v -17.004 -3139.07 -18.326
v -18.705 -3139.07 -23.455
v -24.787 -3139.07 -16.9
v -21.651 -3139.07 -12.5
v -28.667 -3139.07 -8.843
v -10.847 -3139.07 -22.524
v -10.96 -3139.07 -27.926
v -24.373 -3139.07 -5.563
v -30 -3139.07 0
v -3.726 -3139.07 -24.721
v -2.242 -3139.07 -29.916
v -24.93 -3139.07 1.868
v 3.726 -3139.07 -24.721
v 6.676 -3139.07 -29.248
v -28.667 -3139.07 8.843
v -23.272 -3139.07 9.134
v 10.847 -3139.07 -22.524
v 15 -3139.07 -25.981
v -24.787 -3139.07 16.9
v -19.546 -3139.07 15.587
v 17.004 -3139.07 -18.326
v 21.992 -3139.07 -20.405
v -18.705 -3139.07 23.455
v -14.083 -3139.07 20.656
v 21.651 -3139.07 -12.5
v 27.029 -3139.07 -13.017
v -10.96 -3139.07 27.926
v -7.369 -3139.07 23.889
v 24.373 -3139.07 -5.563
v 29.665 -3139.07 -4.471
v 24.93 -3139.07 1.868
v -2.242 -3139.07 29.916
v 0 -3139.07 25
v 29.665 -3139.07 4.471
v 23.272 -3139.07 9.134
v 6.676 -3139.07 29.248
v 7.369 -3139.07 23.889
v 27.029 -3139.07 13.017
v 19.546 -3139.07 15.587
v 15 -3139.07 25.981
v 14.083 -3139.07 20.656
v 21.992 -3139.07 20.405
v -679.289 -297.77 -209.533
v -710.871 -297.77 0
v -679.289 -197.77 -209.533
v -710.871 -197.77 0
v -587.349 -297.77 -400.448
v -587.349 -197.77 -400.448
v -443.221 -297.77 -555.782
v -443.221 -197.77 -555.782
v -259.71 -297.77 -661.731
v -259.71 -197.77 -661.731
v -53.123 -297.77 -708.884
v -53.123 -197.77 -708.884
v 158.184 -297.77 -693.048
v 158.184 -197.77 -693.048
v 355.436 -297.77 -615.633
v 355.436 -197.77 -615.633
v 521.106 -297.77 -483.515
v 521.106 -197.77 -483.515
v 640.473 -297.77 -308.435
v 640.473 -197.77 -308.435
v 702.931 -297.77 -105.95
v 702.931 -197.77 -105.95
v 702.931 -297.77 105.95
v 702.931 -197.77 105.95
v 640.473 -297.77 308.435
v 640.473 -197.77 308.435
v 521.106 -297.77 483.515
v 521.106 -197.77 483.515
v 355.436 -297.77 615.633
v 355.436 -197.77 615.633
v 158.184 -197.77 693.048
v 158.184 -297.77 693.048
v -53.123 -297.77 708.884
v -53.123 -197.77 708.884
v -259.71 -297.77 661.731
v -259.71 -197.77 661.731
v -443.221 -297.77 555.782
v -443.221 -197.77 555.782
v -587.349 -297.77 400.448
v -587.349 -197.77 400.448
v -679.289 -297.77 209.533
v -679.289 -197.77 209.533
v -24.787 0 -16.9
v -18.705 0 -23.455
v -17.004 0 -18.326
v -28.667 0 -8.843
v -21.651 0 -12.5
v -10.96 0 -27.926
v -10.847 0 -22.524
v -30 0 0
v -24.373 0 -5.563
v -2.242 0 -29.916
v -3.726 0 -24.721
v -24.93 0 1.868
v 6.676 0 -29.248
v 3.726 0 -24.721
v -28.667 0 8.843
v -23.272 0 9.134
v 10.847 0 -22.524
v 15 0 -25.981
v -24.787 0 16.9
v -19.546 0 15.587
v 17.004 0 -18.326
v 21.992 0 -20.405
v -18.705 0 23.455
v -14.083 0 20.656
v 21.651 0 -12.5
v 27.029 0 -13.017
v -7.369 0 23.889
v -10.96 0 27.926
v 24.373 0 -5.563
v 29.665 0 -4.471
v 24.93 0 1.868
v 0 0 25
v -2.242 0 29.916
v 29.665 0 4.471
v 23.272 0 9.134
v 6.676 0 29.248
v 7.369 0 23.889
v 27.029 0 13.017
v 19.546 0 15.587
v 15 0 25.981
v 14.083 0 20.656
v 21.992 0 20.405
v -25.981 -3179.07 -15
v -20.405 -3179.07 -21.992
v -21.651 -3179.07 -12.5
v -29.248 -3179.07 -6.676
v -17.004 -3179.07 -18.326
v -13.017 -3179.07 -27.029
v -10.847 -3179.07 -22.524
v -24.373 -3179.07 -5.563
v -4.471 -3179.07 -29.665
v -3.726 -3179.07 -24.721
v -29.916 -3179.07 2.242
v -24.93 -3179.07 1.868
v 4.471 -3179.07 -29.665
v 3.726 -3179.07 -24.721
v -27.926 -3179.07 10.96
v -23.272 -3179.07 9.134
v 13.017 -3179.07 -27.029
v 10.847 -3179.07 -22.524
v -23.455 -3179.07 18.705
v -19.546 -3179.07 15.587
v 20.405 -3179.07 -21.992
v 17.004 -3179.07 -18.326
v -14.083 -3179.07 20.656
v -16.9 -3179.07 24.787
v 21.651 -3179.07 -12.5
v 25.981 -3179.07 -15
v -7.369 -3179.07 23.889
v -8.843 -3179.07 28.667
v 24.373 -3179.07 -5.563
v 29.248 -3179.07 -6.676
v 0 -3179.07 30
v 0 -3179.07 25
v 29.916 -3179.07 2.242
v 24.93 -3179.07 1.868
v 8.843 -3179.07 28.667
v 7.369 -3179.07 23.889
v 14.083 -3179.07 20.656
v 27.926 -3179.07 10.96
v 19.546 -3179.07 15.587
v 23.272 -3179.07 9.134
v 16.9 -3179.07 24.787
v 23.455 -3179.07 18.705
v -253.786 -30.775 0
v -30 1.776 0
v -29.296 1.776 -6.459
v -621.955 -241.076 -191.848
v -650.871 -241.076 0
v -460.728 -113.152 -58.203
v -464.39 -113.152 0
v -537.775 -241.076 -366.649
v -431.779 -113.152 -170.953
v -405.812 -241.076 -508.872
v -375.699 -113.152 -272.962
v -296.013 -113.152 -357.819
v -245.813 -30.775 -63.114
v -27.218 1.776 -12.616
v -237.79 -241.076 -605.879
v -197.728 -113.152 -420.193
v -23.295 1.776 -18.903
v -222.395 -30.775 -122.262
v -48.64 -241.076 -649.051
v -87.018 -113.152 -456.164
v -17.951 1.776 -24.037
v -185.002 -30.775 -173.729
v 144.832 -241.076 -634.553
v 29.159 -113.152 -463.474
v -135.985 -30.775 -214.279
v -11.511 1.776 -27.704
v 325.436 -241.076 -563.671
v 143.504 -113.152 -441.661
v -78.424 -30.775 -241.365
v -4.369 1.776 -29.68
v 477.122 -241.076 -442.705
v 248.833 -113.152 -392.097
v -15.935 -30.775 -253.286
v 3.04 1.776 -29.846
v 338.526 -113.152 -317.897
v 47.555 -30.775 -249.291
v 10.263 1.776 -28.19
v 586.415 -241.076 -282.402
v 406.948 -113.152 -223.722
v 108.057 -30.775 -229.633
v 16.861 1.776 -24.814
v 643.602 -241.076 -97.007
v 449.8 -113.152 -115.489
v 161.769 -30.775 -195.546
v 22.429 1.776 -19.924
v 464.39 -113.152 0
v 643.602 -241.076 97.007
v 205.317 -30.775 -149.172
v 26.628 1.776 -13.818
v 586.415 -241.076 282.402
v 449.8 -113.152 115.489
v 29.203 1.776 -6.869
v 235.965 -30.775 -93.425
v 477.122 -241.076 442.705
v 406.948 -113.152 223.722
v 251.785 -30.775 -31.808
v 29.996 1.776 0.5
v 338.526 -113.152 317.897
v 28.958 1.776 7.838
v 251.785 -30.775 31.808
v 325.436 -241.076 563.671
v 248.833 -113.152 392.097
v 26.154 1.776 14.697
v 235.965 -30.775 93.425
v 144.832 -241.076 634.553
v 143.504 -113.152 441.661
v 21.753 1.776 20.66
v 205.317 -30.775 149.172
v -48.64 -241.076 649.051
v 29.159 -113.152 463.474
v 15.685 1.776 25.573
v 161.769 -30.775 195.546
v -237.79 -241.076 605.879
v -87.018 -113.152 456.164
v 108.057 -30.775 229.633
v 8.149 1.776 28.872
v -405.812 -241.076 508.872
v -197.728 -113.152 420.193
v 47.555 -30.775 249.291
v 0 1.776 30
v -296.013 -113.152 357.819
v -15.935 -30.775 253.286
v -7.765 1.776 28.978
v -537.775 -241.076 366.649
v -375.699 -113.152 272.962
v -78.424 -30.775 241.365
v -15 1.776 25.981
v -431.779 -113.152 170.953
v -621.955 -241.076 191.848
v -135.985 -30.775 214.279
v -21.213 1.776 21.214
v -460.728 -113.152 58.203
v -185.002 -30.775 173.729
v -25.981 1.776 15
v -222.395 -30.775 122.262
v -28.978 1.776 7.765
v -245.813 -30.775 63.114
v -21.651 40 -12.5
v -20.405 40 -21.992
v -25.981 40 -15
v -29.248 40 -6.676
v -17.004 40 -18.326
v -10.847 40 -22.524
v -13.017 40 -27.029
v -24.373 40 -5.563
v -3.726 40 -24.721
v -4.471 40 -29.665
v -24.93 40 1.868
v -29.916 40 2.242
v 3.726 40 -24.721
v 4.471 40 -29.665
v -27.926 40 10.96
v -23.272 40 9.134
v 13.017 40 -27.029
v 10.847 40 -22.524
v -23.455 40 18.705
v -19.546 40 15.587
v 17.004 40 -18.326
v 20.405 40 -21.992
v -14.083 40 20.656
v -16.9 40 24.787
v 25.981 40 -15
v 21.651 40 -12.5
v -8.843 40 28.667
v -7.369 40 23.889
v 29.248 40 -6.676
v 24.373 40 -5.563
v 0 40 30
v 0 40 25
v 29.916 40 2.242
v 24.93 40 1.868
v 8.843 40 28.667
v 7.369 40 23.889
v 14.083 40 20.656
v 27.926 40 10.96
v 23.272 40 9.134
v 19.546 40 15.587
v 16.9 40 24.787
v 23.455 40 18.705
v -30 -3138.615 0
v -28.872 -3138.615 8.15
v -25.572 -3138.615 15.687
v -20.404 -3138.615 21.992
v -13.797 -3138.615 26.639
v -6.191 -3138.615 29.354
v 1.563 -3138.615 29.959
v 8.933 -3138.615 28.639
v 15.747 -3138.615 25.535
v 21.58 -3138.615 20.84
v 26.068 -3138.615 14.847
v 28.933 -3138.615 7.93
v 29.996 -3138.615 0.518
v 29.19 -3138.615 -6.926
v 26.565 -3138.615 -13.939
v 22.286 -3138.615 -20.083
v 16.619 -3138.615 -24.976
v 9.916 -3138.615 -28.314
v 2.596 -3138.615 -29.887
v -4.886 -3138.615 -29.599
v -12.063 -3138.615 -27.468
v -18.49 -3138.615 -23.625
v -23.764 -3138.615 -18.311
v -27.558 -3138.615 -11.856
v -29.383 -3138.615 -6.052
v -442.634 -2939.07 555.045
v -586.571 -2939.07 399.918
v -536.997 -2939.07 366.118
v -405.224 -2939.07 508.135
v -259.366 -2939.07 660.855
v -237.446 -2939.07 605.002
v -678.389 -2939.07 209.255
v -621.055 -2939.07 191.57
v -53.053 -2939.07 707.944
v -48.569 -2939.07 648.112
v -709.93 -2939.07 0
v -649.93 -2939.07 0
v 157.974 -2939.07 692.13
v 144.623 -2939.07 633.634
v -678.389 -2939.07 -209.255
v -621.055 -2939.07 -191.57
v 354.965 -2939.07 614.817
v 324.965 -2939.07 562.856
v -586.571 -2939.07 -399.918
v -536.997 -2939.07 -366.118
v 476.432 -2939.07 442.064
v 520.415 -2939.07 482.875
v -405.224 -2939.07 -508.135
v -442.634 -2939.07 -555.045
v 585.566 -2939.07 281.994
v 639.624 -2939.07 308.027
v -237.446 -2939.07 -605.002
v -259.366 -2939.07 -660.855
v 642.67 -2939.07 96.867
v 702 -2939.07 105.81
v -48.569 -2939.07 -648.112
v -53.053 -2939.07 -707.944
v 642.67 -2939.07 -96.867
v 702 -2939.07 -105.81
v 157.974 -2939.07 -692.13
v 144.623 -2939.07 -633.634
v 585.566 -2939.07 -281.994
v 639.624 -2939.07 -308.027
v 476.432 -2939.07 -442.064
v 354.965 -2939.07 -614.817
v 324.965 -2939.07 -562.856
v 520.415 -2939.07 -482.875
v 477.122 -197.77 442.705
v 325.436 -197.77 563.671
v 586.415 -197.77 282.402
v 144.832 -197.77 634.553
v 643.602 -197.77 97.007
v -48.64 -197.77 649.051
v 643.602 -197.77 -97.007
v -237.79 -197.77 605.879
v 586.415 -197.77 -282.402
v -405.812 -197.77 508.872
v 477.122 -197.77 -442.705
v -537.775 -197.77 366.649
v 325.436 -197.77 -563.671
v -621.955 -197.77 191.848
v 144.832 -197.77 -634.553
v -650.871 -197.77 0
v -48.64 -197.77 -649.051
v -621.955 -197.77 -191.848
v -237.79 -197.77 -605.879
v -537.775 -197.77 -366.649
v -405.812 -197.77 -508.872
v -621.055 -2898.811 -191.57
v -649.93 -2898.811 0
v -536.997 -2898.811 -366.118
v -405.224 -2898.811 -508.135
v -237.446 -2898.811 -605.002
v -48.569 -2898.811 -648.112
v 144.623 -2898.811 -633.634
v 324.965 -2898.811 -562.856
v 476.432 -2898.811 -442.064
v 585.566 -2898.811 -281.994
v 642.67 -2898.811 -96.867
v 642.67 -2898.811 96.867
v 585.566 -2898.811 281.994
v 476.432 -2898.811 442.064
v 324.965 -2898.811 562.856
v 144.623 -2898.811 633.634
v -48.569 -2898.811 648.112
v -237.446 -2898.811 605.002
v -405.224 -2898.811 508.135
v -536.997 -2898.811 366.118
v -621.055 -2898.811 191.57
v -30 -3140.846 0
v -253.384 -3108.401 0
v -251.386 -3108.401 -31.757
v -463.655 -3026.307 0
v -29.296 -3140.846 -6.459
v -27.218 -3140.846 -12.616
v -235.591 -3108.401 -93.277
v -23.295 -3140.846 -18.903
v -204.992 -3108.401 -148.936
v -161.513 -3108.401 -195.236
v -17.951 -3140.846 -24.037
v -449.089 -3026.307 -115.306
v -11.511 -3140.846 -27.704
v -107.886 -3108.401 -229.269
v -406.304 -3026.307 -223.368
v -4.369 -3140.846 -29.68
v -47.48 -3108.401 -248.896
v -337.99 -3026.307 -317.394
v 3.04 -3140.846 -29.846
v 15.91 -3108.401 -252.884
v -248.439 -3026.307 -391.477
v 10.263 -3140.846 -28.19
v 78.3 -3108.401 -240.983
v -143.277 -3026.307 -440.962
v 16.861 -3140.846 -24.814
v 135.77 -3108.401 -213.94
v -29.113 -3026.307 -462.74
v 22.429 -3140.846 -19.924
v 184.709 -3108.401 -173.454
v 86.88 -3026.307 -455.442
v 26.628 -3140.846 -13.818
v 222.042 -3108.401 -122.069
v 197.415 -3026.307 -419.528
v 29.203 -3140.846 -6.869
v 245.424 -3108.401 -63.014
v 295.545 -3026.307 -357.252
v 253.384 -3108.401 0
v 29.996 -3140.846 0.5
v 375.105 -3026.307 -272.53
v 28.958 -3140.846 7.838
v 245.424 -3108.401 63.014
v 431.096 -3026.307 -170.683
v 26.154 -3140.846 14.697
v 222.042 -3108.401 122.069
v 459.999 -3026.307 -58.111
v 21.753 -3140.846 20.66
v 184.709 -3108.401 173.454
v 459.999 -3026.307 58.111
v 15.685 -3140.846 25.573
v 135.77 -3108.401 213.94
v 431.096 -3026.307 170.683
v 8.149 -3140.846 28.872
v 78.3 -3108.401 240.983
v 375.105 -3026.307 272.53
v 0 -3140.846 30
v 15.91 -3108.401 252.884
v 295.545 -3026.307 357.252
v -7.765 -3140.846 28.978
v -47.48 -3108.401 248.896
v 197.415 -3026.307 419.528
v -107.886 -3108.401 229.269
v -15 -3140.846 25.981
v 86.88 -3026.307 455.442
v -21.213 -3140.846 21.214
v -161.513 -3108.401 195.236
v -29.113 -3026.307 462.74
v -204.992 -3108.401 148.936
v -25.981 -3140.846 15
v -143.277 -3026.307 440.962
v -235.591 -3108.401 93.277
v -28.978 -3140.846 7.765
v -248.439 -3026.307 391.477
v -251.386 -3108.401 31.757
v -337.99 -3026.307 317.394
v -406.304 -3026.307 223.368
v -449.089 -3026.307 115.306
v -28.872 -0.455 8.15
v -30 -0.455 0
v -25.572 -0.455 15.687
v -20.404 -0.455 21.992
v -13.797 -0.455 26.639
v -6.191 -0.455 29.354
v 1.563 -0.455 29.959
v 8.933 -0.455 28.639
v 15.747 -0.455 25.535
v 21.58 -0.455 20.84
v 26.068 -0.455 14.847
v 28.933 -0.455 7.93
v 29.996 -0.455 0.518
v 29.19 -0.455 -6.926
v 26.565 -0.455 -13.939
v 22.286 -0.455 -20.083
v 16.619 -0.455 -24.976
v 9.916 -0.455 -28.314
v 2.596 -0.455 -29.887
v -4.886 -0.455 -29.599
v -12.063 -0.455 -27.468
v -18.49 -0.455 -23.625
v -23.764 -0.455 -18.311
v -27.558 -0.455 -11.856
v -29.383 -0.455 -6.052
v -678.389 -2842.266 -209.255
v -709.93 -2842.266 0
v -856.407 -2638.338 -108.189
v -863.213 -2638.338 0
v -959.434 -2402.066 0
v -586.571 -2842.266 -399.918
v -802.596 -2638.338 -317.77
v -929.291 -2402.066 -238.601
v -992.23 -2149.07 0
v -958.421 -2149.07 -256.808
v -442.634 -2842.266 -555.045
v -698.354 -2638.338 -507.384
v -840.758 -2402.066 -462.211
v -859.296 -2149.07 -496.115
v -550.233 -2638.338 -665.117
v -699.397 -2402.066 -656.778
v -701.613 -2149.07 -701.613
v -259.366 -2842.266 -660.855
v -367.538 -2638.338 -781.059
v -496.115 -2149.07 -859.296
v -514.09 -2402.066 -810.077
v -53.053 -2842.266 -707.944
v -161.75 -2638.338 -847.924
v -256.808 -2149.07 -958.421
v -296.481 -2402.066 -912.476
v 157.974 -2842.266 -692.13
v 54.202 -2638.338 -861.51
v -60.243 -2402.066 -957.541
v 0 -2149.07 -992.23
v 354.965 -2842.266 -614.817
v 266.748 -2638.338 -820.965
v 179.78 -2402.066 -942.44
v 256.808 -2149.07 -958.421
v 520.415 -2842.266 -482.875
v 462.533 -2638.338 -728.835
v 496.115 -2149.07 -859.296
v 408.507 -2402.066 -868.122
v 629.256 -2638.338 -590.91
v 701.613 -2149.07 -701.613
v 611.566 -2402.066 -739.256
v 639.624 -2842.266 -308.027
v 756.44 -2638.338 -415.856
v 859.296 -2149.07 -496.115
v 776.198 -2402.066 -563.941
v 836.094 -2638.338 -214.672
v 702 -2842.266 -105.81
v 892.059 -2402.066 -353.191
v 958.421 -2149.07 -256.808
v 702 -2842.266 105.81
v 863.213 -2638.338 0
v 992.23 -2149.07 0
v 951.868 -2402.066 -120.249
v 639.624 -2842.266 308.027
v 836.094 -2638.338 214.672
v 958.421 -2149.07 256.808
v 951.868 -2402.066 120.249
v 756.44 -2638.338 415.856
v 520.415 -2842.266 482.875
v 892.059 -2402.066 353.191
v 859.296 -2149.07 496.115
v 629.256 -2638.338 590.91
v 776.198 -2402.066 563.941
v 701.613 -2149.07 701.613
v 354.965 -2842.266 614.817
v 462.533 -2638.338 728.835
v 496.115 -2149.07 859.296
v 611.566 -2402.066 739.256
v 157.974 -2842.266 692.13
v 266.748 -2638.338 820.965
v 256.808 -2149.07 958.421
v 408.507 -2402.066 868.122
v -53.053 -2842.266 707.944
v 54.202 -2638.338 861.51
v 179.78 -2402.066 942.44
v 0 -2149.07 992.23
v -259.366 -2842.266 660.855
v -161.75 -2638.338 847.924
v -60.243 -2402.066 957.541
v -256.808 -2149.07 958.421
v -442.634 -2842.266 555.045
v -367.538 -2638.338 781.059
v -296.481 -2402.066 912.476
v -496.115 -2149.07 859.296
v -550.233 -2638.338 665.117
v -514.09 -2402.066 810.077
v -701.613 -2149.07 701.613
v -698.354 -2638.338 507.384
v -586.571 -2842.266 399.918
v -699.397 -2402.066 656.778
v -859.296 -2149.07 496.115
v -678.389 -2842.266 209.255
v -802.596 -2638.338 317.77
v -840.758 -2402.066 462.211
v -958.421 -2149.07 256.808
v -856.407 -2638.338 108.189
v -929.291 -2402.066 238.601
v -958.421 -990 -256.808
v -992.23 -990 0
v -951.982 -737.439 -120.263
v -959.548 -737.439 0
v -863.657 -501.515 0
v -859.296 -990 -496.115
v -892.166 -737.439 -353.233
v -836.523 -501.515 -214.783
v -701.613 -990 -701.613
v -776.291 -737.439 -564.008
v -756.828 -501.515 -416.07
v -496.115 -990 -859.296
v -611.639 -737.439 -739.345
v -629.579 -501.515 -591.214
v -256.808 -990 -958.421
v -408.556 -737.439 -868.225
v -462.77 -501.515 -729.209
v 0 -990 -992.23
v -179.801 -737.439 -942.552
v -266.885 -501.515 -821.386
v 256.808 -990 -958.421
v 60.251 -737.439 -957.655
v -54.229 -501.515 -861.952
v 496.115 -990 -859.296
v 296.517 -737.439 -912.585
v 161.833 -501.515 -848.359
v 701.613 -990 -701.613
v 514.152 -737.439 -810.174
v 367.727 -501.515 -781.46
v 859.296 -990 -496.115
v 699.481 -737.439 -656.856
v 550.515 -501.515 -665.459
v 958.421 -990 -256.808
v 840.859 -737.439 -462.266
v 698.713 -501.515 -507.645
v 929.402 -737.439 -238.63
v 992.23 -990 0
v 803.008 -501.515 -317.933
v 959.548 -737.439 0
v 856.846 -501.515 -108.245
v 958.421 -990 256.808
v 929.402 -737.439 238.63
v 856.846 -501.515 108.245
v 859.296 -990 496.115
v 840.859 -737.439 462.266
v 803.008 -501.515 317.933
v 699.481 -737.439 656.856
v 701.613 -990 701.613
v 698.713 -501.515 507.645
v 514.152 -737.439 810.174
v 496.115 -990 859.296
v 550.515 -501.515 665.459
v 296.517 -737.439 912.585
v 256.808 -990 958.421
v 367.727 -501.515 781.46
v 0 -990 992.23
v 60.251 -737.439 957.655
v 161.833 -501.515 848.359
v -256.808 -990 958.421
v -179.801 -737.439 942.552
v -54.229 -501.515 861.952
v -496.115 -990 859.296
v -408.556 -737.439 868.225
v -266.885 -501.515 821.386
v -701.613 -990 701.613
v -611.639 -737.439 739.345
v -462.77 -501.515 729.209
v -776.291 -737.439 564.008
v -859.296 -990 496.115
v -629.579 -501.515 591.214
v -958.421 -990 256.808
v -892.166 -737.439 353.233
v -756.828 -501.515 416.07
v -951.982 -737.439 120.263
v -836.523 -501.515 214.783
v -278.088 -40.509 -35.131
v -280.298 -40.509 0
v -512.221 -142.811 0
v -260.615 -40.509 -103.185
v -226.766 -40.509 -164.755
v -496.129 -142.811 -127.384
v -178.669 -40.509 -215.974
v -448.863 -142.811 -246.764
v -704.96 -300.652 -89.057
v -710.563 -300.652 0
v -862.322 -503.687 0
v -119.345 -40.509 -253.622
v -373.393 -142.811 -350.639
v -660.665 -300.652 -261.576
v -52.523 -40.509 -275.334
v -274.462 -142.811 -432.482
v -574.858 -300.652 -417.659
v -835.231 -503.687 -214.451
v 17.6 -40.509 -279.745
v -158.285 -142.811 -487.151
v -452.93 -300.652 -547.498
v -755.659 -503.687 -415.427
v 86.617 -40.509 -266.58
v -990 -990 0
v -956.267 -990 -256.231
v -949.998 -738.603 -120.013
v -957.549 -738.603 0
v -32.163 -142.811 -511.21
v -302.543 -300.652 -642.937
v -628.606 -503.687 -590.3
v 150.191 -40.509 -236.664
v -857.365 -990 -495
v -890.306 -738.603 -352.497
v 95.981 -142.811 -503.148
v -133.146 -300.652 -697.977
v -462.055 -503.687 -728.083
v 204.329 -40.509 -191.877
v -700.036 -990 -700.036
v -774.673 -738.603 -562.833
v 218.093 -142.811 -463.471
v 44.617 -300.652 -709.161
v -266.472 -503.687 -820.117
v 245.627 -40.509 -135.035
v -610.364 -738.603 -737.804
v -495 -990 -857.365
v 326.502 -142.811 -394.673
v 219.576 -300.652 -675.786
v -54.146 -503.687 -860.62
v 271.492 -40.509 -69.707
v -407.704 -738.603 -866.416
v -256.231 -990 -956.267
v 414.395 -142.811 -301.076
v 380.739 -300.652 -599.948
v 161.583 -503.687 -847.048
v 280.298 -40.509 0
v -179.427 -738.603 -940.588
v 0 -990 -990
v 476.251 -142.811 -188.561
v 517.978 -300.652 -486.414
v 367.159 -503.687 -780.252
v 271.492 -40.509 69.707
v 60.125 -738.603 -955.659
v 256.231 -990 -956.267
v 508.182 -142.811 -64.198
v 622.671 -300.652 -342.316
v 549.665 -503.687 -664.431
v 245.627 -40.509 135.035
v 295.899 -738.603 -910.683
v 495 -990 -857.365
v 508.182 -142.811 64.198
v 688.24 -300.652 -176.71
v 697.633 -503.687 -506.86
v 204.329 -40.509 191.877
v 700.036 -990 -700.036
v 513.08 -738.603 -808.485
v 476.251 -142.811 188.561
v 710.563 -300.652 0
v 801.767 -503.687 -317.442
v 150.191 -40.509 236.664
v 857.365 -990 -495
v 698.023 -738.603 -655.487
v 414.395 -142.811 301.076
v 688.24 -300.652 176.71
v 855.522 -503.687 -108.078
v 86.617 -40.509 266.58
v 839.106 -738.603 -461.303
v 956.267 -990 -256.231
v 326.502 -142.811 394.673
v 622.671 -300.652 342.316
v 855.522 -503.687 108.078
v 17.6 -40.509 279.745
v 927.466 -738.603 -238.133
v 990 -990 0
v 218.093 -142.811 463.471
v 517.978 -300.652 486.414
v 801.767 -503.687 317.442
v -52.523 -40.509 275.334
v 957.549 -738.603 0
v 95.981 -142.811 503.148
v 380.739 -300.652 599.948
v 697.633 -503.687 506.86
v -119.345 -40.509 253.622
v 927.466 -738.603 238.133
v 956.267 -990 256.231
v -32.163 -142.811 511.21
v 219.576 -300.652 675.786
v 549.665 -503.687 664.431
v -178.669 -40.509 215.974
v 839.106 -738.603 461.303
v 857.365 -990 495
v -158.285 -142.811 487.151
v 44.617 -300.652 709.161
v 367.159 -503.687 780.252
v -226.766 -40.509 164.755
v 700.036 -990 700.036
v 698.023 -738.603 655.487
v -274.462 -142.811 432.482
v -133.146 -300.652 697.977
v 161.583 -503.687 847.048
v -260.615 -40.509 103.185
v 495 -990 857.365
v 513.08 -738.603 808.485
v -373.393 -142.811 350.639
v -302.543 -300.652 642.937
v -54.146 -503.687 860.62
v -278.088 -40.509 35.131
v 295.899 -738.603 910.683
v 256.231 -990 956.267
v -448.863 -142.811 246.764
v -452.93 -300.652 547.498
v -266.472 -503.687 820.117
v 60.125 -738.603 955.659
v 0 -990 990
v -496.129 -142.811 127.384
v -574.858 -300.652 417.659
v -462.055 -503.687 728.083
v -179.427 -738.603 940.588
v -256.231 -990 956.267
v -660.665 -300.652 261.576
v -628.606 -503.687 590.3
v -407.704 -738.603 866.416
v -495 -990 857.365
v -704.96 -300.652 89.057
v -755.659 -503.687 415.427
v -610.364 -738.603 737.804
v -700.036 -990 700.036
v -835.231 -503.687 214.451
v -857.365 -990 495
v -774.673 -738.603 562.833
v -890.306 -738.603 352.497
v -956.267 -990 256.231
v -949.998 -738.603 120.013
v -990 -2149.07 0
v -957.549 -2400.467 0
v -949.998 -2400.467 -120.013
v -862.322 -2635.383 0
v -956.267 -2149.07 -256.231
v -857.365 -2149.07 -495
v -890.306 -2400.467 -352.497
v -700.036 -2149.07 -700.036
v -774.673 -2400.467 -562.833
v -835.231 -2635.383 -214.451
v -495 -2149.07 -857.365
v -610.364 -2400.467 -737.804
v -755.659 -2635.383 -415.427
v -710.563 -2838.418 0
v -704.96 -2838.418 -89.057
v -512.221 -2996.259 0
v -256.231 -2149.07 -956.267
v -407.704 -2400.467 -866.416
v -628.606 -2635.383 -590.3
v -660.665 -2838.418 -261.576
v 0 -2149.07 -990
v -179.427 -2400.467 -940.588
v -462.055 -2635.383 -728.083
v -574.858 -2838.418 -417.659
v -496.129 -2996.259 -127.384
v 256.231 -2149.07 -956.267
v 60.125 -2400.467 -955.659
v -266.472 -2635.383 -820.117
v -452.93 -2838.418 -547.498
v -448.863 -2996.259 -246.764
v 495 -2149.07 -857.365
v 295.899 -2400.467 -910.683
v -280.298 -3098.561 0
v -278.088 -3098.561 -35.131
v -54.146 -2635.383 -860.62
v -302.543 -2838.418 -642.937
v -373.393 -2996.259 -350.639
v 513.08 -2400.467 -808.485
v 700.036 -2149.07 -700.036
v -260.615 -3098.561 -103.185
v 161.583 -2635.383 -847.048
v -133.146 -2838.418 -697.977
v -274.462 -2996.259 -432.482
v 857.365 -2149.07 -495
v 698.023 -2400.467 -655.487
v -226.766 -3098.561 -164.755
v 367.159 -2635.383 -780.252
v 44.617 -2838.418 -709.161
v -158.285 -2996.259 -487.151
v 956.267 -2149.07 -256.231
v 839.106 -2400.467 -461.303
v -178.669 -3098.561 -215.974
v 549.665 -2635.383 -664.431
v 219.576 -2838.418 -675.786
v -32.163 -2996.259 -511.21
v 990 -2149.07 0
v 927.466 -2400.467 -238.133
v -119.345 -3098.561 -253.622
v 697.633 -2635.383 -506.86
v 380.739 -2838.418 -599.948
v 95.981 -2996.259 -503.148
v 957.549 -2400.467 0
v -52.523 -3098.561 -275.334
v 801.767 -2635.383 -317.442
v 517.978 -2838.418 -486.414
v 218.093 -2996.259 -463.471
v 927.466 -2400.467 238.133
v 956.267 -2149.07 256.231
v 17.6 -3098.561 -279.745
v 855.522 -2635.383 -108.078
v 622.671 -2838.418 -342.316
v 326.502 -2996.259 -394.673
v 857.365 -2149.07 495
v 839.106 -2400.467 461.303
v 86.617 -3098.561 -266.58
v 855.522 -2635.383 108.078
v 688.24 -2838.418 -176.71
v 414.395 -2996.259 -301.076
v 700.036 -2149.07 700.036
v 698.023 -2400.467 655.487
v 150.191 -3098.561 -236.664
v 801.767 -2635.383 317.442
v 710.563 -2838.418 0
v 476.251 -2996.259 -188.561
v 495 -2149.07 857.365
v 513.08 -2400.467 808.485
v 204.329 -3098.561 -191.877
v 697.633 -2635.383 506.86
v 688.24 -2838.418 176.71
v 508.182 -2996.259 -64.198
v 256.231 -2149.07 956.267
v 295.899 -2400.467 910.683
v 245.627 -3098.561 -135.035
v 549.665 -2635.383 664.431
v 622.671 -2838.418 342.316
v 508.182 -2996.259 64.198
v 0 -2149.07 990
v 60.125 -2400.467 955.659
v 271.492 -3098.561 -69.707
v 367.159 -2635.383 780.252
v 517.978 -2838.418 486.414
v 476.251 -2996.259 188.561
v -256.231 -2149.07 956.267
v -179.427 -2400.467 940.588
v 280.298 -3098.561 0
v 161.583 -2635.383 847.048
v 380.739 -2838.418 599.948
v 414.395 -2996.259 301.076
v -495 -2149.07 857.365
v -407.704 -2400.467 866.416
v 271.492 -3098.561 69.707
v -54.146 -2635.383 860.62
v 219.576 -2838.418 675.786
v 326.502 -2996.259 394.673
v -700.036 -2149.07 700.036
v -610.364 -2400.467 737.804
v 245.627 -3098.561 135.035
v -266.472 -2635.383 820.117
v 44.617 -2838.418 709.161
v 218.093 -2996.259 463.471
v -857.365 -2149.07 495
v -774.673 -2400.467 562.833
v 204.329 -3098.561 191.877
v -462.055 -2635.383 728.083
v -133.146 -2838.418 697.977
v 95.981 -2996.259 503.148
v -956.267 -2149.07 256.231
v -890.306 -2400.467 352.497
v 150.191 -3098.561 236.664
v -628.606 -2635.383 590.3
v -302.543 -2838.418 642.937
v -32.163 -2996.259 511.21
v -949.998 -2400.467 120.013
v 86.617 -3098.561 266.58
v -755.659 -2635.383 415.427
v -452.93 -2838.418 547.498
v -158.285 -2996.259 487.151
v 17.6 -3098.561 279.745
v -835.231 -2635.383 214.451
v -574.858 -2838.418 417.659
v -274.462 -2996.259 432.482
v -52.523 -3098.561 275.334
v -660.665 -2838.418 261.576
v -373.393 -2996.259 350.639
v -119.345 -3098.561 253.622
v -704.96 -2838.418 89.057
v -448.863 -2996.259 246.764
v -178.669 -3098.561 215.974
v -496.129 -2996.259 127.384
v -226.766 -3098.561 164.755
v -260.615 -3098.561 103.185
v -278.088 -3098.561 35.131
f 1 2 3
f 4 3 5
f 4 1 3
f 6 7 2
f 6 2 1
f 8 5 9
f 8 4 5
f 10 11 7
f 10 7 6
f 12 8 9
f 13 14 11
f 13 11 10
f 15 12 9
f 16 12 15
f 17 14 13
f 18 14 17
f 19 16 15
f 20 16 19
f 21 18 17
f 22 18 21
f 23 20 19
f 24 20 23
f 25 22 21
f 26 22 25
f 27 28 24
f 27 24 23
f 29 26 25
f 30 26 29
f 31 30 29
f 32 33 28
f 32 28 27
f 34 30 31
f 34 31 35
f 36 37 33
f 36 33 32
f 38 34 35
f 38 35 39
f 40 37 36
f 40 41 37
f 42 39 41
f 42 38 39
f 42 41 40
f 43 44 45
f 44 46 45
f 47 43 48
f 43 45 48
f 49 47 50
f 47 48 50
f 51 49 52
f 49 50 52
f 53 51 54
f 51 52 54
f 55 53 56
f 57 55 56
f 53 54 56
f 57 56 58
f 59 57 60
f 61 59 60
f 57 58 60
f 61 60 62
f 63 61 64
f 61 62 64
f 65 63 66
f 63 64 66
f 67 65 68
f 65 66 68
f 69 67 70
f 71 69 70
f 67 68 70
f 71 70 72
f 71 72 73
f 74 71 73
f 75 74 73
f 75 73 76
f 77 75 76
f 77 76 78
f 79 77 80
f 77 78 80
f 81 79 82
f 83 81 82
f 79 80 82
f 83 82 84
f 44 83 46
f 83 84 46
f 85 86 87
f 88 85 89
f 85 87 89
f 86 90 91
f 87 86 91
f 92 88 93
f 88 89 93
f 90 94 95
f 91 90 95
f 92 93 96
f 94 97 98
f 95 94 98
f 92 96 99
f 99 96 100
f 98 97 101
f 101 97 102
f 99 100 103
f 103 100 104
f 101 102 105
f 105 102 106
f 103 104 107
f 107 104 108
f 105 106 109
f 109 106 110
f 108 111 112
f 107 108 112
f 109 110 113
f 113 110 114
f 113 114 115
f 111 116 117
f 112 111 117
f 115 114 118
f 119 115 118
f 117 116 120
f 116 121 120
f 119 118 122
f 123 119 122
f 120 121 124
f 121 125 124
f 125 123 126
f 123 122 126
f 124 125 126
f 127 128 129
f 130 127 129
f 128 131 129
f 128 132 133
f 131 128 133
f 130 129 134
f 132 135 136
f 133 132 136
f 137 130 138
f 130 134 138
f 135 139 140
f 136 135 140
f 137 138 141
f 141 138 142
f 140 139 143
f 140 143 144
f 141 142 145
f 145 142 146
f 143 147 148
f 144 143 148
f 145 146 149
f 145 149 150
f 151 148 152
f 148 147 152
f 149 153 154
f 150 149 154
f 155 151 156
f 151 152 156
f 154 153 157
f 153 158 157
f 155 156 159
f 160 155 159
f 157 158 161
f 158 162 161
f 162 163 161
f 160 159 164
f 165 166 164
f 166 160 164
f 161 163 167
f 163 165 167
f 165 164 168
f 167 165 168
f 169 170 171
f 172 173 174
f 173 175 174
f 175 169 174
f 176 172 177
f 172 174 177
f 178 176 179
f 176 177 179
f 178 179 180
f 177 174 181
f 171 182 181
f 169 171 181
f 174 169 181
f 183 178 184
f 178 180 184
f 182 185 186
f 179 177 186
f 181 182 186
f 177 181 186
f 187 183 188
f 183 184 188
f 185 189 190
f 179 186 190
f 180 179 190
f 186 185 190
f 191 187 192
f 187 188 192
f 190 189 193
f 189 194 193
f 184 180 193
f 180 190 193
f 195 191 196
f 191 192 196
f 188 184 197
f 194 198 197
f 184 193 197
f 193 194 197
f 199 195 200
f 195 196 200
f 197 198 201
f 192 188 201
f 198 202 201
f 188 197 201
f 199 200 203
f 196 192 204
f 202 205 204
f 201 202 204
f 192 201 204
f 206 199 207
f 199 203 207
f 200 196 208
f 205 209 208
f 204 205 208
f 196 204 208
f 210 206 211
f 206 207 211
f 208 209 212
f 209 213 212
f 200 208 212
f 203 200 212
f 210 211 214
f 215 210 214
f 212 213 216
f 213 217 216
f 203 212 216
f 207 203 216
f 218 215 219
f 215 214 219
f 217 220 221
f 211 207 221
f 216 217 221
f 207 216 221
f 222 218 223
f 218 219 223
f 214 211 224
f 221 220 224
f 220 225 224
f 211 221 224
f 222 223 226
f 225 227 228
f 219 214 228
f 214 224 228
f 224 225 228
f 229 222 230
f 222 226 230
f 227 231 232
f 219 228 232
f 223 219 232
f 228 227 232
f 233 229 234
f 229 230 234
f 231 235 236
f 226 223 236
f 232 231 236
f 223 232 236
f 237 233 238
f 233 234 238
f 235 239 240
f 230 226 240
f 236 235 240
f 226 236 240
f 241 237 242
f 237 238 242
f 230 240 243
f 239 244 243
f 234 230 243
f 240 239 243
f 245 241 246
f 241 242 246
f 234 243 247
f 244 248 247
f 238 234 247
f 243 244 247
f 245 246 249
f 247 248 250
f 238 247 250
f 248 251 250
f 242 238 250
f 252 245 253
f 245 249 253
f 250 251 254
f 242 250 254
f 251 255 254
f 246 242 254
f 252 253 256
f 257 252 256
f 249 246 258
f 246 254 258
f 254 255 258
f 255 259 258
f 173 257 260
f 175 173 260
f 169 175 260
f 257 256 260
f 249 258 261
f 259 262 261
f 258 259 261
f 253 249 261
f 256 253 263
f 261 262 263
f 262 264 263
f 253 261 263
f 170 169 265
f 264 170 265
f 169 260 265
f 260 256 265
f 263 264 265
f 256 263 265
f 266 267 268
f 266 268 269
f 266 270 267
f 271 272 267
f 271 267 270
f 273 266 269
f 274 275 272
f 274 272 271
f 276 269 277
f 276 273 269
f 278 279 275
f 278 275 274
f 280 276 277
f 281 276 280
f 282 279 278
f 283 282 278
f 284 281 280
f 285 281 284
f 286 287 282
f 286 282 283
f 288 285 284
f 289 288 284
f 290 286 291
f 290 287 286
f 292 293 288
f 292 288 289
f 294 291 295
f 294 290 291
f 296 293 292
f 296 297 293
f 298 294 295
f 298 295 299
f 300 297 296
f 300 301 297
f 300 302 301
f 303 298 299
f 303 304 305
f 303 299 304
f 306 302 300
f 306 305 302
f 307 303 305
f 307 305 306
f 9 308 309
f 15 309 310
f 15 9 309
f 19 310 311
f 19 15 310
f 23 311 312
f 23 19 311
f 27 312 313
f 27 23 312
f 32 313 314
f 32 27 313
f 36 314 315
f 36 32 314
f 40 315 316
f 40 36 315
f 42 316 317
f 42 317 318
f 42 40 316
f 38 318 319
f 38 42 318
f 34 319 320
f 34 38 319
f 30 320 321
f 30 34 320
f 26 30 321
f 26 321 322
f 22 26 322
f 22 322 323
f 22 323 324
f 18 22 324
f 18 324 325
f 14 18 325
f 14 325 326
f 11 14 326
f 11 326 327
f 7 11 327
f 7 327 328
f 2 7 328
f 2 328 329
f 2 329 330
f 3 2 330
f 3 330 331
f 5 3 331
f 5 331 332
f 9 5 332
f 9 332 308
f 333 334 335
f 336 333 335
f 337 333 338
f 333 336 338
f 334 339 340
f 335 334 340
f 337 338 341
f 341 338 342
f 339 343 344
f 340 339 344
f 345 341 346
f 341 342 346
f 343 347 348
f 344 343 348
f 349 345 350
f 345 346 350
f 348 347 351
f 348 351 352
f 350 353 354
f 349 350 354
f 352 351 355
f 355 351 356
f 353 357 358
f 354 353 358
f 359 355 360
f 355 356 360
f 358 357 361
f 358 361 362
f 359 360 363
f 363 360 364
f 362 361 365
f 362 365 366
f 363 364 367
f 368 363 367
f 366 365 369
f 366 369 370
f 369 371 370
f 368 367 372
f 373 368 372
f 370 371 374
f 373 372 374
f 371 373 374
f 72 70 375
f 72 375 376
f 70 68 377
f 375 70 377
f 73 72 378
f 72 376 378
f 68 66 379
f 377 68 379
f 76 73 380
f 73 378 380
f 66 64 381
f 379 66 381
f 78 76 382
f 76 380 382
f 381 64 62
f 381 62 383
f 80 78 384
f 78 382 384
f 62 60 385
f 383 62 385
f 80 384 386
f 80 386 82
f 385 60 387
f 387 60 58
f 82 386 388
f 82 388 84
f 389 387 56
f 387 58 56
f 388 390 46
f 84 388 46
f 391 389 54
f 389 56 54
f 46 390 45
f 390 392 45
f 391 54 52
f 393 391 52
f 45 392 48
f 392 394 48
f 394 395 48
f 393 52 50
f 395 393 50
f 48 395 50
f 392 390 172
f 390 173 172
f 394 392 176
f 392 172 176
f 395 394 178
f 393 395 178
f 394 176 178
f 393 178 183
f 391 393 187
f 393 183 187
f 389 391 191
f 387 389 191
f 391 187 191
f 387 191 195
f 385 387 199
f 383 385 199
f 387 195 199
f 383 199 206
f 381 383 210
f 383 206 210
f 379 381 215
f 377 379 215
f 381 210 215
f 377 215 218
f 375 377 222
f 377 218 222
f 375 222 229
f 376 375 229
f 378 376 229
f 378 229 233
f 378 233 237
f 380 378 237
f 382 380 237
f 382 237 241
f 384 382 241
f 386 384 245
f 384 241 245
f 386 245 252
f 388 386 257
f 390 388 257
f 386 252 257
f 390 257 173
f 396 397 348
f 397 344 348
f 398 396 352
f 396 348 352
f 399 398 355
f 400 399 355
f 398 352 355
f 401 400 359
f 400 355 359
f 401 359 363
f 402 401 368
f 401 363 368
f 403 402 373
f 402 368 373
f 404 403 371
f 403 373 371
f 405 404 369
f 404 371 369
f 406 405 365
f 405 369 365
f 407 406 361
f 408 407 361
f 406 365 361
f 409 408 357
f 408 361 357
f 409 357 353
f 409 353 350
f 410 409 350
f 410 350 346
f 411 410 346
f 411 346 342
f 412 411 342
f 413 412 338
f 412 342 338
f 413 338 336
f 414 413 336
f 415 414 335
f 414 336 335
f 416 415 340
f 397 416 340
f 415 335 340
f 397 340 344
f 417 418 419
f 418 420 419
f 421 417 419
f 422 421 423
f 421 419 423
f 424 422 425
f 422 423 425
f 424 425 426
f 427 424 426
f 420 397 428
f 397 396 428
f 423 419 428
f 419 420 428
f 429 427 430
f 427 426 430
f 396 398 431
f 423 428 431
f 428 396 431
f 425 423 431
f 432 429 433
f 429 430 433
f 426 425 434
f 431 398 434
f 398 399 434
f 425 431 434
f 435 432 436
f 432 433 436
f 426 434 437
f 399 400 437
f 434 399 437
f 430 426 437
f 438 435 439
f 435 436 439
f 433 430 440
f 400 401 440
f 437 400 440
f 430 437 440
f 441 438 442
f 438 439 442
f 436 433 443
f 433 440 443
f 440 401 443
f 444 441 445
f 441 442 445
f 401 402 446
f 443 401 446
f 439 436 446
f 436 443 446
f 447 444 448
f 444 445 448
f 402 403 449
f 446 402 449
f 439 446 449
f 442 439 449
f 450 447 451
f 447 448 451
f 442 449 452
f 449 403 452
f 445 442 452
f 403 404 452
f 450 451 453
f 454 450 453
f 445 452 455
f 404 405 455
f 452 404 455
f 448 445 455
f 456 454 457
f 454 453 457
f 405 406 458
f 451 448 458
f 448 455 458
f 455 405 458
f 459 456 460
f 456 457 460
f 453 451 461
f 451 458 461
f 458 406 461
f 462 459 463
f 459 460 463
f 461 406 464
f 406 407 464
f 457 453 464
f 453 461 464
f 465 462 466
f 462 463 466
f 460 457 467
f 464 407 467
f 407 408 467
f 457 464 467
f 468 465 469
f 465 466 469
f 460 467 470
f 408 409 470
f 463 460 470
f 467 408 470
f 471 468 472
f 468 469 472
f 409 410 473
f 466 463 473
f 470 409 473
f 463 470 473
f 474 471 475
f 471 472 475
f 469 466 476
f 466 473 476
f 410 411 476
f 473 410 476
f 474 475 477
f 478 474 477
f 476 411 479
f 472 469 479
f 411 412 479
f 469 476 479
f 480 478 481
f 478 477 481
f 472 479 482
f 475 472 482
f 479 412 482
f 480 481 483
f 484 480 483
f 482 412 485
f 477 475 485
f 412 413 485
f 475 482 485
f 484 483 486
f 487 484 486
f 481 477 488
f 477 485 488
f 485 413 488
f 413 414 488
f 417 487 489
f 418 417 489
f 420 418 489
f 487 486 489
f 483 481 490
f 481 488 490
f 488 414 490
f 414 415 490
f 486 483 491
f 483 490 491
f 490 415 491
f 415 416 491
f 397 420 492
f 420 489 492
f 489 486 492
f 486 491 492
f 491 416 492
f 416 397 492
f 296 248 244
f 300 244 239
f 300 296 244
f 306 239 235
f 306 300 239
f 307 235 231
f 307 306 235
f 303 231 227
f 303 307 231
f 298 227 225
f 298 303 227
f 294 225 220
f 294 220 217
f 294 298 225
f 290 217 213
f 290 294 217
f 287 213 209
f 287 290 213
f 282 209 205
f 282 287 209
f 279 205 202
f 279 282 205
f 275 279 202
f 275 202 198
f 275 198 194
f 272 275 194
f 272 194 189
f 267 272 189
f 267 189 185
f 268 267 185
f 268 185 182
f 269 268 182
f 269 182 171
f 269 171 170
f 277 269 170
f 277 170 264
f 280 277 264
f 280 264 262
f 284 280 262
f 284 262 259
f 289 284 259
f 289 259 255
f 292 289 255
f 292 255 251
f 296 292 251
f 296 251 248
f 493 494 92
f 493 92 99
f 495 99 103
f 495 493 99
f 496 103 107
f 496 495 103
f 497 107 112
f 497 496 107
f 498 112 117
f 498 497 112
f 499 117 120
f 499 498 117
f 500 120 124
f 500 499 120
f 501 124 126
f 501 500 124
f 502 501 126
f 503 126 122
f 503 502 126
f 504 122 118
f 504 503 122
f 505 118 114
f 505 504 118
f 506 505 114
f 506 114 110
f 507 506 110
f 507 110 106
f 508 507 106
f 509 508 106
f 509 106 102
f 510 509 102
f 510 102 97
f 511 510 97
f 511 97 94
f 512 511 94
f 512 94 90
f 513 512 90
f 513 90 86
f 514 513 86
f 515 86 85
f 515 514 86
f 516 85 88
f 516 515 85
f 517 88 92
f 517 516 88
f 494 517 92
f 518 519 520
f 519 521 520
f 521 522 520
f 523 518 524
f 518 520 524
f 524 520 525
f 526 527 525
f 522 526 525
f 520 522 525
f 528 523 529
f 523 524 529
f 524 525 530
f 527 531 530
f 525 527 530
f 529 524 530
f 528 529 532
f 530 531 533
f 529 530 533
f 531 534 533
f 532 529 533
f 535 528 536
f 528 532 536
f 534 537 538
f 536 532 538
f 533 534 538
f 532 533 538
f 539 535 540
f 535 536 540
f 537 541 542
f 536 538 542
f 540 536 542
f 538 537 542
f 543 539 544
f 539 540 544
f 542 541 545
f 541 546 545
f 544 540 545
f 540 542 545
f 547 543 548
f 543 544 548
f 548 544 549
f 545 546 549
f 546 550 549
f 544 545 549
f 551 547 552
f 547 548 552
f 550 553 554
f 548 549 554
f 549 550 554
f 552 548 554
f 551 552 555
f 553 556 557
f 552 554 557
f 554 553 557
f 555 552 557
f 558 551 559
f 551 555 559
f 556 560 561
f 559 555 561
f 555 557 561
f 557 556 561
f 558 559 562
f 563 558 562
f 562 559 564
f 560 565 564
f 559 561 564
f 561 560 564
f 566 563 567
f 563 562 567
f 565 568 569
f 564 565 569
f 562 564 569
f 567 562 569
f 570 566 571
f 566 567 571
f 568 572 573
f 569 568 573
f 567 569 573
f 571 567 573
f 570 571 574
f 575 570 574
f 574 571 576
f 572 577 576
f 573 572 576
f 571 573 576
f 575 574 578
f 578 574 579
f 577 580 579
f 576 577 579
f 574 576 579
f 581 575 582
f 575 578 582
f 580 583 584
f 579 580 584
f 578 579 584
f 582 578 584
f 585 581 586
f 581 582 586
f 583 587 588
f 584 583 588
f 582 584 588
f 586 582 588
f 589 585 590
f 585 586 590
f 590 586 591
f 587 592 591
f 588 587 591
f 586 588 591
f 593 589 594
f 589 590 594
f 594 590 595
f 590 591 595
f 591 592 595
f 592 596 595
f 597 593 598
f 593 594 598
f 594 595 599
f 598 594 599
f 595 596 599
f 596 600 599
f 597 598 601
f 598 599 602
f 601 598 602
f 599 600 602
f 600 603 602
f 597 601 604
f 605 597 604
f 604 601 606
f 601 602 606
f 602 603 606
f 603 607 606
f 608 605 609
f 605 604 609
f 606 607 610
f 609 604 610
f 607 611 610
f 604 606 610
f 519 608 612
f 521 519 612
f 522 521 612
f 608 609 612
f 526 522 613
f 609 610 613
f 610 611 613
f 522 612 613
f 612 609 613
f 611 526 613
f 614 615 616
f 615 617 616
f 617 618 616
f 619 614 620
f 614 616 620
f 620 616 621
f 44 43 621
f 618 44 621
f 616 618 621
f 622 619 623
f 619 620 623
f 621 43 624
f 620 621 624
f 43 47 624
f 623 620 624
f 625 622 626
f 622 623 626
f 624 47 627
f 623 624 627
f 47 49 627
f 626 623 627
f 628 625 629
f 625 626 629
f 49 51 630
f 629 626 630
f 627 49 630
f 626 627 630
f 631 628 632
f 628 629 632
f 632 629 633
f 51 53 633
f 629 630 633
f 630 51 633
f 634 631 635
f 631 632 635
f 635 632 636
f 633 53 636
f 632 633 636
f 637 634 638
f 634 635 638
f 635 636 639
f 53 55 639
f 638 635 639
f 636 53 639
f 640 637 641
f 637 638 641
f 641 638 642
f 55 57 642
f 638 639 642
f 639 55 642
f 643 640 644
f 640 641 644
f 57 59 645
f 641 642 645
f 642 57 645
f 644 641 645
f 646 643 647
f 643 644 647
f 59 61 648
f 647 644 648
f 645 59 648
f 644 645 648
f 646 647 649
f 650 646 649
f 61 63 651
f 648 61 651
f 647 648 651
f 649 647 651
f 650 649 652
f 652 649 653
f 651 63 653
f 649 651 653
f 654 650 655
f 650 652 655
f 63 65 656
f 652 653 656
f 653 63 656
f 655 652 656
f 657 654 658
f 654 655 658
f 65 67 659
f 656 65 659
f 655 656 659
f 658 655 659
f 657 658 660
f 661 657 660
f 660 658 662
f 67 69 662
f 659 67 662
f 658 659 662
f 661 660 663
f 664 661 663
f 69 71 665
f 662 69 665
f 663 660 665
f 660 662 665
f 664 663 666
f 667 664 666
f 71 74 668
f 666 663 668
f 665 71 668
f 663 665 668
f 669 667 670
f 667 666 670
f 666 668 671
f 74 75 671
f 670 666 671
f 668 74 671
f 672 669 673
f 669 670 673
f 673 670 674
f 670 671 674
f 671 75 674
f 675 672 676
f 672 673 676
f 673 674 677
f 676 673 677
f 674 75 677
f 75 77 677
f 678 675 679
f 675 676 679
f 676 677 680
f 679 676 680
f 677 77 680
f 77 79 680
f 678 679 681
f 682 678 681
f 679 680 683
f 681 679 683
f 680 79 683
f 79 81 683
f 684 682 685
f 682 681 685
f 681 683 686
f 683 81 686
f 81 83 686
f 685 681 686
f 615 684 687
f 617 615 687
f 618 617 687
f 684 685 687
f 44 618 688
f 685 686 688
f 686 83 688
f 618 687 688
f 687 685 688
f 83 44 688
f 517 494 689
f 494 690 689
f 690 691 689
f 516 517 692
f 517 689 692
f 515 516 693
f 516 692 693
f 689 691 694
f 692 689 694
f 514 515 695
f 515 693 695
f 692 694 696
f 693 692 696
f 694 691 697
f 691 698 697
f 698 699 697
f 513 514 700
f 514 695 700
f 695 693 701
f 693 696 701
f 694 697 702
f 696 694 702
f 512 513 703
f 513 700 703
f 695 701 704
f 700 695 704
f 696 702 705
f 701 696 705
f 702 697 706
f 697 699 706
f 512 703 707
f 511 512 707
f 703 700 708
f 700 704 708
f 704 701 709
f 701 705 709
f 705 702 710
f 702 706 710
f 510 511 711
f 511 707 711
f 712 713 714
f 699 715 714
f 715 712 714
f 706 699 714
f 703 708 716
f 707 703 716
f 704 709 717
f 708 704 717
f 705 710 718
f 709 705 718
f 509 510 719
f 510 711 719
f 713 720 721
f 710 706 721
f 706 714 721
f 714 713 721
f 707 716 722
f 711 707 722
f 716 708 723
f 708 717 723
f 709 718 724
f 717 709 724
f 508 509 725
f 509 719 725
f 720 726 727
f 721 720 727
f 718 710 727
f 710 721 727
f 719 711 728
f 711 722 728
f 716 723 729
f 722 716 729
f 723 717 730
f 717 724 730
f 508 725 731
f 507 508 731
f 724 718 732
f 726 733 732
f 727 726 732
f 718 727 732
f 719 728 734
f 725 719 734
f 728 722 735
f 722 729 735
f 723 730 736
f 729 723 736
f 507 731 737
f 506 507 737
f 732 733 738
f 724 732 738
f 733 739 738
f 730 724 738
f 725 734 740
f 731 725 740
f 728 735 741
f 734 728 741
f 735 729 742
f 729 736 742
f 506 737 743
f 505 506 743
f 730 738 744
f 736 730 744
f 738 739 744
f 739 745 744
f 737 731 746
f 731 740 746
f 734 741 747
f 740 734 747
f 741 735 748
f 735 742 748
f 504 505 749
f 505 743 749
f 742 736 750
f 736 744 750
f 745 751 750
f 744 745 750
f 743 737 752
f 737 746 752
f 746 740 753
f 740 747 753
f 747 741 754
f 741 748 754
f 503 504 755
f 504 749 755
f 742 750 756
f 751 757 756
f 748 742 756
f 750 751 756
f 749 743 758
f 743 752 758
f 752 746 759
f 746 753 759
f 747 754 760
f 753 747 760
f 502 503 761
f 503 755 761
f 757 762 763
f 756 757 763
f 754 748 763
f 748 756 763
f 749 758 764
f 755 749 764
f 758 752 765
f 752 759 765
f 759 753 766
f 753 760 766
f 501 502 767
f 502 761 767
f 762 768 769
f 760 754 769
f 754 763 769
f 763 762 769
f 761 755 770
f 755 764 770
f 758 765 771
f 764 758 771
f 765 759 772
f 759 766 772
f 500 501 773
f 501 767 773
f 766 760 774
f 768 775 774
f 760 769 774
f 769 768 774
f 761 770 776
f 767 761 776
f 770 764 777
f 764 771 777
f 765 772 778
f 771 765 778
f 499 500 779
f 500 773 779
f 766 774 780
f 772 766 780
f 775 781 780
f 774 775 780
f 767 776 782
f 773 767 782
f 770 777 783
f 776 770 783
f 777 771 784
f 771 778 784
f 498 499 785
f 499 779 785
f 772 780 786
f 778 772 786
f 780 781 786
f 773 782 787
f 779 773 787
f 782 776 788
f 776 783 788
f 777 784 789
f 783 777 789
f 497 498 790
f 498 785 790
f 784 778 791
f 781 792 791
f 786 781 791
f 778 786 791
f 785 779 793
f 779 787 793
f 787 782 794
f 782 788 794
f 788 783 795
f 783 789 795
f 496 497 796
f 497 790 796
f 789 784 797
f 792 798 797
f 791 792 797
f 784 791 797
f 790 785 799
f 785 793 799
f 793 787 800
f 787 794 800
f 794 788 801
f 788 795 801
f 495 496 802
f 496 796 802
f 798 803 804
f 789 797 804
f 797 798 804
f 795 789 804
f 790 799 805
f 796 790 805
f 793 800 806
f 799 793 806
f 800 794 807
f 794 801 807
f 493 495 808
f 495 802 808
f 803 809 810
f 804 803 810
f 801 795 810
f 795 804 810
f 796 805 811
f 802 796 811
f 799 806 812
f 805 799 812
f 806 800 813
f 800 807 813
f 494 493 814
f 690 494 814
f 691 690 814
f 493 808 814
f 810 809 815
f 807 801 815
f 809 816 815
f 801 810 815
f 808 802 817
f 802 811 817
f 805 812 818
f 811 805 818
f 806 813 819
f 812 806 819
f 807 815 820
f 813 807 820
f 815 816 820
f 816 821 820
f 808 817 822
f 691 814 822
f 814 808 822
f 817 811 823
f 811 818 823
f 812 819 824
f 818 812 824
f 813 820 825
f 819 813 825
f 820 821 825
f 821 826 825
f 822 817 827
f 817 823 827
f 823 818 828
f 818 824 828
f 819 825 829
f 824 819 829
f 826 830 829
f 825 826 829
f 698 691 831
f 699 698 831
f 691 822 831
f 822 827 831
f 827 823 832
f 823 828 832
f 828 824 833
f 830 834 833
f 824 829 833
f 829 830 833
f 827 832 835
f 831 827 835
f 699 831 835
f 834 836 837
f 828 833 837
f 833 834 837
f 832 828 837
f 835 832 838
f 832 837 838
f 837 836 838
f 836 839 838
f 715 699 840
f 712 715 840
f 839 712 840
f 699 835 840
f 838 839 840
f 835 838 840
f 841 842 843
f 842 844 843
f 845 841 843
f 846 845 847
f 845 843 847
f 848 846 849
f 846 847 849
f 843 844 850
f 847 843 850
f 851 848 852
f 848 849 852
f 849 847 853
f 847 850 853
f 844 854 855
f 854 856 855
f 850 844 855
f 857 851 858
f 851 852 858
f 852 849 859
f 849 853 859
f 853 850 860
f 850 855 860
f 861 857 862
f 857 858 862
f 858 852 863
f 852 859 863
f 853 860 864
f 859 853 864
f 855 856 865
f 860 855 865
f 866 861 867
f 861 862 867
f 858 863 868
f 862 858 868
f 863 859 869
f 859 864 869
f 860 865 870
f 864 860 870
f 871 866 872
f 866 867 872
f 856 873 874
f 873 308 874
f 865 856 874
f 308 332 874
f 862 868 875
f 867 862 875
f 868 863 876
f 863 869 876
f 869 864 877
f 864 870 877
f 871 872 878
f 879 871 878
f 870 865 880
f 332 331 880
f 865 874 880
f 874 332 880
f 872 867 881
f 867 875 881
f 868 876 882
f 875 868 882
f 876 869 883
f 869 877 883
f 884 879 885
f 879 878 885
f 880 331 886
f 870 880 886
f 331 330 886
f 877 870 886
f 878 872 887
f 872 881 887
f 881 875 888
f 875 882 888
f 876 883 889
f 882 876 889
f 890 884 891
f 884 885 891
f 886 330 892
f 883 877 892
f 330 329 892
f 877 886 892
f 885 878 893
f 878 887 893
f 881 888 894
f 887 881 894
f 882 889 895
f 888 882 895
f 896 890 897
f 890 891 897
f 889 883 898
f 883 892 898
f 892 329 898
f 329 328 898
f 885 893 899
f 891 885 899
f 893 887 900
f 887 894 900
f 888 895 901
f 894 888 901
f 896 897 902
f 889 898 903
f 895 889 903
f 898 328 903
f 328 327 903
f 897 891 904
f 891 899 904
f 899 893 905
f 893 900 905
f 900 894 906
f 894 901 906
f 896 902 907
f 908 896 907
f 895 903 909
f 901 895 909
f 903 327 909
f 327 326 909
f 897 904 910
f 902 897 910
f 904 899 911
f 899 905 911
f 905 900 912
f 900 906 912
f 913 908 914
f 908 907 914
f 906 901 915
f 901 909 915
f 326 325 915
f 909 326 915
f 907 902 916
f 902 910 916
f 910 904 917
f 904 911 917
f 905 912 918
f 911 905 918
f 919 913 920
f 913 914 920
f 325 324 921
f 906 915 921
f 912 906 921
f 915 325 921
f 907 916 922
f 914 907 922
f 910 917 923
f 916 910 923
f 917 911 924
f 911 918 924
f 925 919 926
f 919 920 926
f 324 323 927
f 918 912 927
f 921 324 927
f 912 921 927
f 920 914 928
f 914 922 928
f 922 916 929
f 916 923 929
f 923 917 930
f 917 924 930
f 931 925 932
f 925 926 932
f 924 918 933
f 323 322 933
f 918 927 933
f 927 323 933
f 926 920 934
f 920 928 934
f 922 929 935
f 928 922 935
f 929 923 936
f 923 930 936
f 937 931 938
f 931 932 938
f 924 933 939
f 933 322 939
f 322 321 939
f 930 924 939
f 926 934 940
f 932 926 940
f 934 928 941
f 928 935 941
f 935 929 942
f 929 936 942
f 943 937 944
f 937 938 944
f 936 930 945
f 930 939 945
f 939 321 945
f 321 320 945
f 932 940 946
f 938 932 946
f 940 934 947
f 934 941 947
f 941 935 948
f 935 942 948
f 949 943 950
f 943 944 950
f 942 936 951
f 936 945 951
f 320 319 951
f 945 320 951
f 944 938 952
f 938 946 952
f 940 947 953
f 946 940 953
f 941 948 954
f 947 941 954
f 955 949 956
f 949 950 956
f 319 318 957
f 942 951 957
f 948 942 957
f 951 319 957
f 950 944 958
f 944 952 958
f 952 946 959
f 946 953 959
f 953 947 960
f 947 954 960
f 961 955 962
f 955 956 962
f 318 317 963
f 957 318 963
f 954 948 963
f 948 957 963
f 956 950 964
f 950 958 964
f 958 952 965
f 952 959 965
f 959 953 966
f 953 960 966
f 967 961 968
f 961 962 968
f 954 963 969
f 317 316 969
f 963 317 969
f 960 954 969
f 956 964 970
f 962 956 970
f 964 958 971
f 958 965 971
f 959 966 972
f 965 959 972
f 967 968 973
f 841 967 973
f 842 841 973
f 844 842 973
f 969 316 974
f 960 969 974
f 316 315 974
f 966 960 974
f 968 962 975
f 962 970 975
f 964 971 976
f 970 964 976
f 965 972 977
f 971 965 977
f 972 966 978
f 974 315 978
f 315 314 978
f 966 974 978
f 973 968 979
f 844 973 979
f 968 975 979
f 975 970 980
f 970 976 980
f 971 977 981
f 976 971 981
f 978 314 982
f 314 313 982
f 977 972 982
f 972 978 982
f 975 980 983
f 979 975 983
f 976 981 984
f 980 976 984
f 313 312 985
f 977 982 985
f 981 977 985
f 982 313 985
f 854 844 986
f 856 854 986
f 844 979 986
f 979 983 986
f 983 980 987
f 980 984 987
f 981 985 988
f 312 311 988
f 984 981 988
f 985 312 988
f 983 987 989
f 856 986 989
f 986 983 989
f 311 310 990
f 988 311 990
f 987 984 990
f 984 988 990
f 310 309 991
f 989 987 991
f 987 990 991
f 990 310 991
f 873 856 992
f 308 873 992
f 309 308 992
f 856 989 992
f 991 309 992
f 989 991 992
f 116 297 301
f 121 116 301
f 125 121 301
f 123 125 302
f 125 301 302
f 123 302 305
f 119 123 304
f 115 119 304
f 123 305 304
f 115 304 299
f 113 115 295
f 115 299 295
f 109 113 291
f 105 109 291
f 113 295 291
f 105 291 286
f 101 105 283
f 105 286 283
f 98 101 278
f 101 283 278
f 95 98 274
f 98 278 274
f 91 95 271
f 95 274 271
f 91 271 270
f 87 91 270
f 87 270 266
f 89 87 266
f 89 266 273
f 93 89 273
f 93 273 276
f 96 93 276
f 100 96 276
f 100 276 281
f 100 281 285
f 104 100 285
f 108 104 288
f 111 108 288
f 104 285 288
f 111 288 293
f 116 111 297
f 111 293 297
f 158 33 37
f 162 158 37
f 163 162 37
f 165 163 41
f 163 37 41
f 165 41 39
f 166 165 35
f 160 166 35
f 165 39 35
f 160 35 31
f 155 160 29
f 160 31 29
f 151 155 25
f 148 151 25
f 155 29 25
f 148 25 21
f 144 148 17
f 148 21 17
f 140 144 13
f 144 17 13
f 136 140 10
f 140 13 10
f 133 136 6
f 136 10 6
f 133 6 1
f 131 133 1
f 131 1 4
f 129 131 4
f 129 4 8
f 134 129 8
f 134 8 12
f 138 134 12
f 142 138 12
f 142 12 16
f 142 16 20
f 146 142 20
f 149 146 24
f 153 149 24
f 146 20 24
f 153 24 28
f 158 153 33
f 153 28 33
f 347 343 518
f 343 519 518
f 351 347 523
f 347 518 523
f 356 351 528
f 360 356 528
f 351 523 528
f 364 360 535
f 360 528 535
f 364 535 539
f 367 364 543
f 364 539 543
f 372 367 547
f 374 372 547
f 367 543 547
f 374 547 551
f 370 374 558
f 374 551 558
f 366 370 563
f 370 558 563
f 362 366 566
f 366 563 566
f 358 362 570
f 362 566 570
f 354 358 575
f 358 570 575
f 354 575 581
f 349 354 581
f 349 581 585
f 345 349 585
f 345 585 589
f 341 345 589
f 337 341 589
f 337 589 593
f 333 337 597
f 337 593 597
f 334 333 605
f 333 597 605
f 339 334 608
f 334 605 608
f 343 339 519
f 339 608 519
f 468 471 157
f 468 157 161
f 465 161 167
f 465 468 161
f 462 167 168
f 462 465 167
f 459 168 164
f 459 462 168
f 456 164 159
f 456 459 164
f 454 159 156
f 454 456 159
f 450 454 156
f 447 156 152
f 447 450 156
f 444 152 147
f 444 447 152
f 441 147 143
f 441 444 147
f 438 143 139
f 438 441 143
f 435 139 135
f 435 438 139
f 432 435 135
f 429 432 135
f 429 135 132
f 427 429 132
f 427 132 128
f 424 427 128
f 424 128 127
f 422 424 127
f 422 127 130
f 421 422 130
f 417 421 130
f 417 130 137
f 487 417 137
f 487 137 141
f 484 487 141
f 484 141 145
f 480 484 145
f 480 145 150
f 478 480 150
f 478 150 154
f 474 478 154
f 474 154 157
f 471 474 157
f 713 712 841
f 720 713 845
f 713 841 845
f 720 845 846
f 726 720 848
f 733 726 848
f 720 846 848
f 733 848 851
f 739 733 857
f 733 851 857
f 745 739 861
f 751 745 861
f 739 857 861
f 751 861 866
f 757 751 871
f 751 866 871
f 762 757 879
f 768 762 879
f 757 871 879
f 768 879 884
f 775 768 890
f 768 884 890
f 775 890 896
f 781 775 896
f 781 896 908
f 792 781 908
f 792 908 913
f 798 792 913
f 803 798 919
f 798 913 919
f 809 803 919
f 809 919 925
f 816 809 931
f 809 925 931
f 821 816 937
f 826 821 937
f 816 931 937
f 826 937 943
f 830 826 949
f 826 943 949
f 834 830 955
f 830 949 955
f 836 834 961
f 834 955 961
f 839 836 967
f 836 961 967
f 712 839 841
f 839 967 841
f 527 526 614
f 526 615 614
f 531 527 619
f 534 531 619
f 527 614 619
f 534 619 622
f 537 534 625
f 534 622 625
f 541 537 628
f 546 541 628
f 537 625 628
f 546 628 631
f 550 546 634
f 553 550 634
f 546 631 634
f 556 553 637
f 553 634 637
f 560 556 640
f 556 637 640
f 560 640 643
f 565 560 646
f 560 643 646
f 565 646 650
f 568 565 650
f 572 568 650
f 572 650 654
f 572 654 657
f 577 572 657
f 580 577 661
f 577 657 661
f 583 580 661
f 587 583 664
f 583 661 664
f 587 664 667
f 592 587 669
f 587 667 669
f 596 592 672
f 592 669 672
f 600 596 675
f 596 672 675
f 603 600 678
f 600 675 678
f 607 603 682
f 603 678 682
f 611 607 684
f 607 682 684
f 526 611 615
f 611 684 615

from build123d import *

# Parameters (mm, degrees)
CUT_EXTRUDE1_DEPTH      = 3441.466020149
CUT_EXTRUDE1_DEPTH_BACK = 3441.466020149
SKETCH2_R               = 30
BOSS_EXTRUDE2_START     = 40
SKETCH3_R               = 30
SKETCH3_R_2             = 25
BOSS_EXTRUDE2_DEPTH     = 40
LPATTERN1_COUNT         = 2
LPATTERN1_PITCH         = 3179.07


with BuildPart() as part:
    # Sketch1 → Revolve1 (revolve)
    with BuildSketch(Plane.XY, mode=Mode.PRIVATE) as revolve1_sk:
        with BuildLine():
            Line((0, -3139.07), (0, -3141.3))
            ThreePointArc((0, -3141.3), (346.846238096, -3078.703293304), (649.929573972, -2898.811236545))
            Line((649.929573972, -2898.811236545), (649.929573972, -2939.07))
            Line((649.929573972, -2939.07), (709.929573972, -2939.07))
            Line((709.929573972, -2939.07), (709.929573972, -2842.265768092))
            ThreePointArc((709.929573972, -2842.265768092), (918.948800011, -2523.307191977), (992.23, -2149.07))
            Line((992.23, -2149.07), (992.23, -990))
            ThreePointArc((992.23, -990), (919.202969777, -616.387536005), (710.871296368, -297.77))
            Line((710.871296368, -297.77), (710.871296368, -197.77))
            Line((710.871296368, -197.77), (650.871296368, -197.77))
            Line((650.871296368, -197.77), (650.871296368, -241.076153094))
            ThreePointArc((650.871296368, -241.076153094), (347.430327033, -60.584839398), (0, 2.23))
            Line((0, 2.23), (0, 0))
            ThreePointArc((0, 0), (700.035713375, -289.964286625), (990, -990))
            Line((990, -990), (990, -2149.07))
            ThreePointArc((990, -2149.07), (700.035713375, -2849.105713375), (0, -3139.07))
        make_face()
    revolve(revolve1_sk.sketch.rotate(Axis((0, 0, 0), (0, -1, 0)), 180), axis=Axis((0, 0, 0), (0, -1, 0)))

    # Sketch2 → Cut-Extrude1 (cut, two sides: drawn at the far end of the back side and taken through both)
    with BuildSketch(Plane(origin=(0, 0, 0), x_dir=(1, 0, 0), z_dir=(0, 1, 0)).offset(-CUT_EXTRUDE1_DEPTH_BACK)):
        with Locations(Location((0, 0, 0), (0, 0, 180))):
            Circle(SKETCH2_R)
    extrude(amount=CUT_EXTRUDE1_DEPTH + CUT_EXTRUDE1_DEPTH_BACK, mode=Mode.SUBTRACT)

    # Sketch3 → Boss-Extrude2 (add)
    with BuildSketch(Plane(origin=(0, 0, 0), x_dir=(1, 0, 0), z_dir=(0, 1, 0)).offset(BOSS_EXTRUDE2_START)):
        with Locations(Location((0, 0, 0), (0, 0, 270))):
            Circle(SKETCH3_R)
        with Locations(Location((0, 0, 0), (0, 0, 270))):
            Circle(SKETCH3_R_2, mode=Mode.SUBTRACT)
    boss_extrude2 = extrude(amount=-BOSS_EXTRUDE2_DEPTH)

    # LPattern1: Boss-Extrude2 ×2
    with Locations(*[(0, -i * LPATTERN1_PITCH, 0) for i in range(1, LPATTERN1_COUNT)]):
        add(boss_extrude2)


solid = part.part
